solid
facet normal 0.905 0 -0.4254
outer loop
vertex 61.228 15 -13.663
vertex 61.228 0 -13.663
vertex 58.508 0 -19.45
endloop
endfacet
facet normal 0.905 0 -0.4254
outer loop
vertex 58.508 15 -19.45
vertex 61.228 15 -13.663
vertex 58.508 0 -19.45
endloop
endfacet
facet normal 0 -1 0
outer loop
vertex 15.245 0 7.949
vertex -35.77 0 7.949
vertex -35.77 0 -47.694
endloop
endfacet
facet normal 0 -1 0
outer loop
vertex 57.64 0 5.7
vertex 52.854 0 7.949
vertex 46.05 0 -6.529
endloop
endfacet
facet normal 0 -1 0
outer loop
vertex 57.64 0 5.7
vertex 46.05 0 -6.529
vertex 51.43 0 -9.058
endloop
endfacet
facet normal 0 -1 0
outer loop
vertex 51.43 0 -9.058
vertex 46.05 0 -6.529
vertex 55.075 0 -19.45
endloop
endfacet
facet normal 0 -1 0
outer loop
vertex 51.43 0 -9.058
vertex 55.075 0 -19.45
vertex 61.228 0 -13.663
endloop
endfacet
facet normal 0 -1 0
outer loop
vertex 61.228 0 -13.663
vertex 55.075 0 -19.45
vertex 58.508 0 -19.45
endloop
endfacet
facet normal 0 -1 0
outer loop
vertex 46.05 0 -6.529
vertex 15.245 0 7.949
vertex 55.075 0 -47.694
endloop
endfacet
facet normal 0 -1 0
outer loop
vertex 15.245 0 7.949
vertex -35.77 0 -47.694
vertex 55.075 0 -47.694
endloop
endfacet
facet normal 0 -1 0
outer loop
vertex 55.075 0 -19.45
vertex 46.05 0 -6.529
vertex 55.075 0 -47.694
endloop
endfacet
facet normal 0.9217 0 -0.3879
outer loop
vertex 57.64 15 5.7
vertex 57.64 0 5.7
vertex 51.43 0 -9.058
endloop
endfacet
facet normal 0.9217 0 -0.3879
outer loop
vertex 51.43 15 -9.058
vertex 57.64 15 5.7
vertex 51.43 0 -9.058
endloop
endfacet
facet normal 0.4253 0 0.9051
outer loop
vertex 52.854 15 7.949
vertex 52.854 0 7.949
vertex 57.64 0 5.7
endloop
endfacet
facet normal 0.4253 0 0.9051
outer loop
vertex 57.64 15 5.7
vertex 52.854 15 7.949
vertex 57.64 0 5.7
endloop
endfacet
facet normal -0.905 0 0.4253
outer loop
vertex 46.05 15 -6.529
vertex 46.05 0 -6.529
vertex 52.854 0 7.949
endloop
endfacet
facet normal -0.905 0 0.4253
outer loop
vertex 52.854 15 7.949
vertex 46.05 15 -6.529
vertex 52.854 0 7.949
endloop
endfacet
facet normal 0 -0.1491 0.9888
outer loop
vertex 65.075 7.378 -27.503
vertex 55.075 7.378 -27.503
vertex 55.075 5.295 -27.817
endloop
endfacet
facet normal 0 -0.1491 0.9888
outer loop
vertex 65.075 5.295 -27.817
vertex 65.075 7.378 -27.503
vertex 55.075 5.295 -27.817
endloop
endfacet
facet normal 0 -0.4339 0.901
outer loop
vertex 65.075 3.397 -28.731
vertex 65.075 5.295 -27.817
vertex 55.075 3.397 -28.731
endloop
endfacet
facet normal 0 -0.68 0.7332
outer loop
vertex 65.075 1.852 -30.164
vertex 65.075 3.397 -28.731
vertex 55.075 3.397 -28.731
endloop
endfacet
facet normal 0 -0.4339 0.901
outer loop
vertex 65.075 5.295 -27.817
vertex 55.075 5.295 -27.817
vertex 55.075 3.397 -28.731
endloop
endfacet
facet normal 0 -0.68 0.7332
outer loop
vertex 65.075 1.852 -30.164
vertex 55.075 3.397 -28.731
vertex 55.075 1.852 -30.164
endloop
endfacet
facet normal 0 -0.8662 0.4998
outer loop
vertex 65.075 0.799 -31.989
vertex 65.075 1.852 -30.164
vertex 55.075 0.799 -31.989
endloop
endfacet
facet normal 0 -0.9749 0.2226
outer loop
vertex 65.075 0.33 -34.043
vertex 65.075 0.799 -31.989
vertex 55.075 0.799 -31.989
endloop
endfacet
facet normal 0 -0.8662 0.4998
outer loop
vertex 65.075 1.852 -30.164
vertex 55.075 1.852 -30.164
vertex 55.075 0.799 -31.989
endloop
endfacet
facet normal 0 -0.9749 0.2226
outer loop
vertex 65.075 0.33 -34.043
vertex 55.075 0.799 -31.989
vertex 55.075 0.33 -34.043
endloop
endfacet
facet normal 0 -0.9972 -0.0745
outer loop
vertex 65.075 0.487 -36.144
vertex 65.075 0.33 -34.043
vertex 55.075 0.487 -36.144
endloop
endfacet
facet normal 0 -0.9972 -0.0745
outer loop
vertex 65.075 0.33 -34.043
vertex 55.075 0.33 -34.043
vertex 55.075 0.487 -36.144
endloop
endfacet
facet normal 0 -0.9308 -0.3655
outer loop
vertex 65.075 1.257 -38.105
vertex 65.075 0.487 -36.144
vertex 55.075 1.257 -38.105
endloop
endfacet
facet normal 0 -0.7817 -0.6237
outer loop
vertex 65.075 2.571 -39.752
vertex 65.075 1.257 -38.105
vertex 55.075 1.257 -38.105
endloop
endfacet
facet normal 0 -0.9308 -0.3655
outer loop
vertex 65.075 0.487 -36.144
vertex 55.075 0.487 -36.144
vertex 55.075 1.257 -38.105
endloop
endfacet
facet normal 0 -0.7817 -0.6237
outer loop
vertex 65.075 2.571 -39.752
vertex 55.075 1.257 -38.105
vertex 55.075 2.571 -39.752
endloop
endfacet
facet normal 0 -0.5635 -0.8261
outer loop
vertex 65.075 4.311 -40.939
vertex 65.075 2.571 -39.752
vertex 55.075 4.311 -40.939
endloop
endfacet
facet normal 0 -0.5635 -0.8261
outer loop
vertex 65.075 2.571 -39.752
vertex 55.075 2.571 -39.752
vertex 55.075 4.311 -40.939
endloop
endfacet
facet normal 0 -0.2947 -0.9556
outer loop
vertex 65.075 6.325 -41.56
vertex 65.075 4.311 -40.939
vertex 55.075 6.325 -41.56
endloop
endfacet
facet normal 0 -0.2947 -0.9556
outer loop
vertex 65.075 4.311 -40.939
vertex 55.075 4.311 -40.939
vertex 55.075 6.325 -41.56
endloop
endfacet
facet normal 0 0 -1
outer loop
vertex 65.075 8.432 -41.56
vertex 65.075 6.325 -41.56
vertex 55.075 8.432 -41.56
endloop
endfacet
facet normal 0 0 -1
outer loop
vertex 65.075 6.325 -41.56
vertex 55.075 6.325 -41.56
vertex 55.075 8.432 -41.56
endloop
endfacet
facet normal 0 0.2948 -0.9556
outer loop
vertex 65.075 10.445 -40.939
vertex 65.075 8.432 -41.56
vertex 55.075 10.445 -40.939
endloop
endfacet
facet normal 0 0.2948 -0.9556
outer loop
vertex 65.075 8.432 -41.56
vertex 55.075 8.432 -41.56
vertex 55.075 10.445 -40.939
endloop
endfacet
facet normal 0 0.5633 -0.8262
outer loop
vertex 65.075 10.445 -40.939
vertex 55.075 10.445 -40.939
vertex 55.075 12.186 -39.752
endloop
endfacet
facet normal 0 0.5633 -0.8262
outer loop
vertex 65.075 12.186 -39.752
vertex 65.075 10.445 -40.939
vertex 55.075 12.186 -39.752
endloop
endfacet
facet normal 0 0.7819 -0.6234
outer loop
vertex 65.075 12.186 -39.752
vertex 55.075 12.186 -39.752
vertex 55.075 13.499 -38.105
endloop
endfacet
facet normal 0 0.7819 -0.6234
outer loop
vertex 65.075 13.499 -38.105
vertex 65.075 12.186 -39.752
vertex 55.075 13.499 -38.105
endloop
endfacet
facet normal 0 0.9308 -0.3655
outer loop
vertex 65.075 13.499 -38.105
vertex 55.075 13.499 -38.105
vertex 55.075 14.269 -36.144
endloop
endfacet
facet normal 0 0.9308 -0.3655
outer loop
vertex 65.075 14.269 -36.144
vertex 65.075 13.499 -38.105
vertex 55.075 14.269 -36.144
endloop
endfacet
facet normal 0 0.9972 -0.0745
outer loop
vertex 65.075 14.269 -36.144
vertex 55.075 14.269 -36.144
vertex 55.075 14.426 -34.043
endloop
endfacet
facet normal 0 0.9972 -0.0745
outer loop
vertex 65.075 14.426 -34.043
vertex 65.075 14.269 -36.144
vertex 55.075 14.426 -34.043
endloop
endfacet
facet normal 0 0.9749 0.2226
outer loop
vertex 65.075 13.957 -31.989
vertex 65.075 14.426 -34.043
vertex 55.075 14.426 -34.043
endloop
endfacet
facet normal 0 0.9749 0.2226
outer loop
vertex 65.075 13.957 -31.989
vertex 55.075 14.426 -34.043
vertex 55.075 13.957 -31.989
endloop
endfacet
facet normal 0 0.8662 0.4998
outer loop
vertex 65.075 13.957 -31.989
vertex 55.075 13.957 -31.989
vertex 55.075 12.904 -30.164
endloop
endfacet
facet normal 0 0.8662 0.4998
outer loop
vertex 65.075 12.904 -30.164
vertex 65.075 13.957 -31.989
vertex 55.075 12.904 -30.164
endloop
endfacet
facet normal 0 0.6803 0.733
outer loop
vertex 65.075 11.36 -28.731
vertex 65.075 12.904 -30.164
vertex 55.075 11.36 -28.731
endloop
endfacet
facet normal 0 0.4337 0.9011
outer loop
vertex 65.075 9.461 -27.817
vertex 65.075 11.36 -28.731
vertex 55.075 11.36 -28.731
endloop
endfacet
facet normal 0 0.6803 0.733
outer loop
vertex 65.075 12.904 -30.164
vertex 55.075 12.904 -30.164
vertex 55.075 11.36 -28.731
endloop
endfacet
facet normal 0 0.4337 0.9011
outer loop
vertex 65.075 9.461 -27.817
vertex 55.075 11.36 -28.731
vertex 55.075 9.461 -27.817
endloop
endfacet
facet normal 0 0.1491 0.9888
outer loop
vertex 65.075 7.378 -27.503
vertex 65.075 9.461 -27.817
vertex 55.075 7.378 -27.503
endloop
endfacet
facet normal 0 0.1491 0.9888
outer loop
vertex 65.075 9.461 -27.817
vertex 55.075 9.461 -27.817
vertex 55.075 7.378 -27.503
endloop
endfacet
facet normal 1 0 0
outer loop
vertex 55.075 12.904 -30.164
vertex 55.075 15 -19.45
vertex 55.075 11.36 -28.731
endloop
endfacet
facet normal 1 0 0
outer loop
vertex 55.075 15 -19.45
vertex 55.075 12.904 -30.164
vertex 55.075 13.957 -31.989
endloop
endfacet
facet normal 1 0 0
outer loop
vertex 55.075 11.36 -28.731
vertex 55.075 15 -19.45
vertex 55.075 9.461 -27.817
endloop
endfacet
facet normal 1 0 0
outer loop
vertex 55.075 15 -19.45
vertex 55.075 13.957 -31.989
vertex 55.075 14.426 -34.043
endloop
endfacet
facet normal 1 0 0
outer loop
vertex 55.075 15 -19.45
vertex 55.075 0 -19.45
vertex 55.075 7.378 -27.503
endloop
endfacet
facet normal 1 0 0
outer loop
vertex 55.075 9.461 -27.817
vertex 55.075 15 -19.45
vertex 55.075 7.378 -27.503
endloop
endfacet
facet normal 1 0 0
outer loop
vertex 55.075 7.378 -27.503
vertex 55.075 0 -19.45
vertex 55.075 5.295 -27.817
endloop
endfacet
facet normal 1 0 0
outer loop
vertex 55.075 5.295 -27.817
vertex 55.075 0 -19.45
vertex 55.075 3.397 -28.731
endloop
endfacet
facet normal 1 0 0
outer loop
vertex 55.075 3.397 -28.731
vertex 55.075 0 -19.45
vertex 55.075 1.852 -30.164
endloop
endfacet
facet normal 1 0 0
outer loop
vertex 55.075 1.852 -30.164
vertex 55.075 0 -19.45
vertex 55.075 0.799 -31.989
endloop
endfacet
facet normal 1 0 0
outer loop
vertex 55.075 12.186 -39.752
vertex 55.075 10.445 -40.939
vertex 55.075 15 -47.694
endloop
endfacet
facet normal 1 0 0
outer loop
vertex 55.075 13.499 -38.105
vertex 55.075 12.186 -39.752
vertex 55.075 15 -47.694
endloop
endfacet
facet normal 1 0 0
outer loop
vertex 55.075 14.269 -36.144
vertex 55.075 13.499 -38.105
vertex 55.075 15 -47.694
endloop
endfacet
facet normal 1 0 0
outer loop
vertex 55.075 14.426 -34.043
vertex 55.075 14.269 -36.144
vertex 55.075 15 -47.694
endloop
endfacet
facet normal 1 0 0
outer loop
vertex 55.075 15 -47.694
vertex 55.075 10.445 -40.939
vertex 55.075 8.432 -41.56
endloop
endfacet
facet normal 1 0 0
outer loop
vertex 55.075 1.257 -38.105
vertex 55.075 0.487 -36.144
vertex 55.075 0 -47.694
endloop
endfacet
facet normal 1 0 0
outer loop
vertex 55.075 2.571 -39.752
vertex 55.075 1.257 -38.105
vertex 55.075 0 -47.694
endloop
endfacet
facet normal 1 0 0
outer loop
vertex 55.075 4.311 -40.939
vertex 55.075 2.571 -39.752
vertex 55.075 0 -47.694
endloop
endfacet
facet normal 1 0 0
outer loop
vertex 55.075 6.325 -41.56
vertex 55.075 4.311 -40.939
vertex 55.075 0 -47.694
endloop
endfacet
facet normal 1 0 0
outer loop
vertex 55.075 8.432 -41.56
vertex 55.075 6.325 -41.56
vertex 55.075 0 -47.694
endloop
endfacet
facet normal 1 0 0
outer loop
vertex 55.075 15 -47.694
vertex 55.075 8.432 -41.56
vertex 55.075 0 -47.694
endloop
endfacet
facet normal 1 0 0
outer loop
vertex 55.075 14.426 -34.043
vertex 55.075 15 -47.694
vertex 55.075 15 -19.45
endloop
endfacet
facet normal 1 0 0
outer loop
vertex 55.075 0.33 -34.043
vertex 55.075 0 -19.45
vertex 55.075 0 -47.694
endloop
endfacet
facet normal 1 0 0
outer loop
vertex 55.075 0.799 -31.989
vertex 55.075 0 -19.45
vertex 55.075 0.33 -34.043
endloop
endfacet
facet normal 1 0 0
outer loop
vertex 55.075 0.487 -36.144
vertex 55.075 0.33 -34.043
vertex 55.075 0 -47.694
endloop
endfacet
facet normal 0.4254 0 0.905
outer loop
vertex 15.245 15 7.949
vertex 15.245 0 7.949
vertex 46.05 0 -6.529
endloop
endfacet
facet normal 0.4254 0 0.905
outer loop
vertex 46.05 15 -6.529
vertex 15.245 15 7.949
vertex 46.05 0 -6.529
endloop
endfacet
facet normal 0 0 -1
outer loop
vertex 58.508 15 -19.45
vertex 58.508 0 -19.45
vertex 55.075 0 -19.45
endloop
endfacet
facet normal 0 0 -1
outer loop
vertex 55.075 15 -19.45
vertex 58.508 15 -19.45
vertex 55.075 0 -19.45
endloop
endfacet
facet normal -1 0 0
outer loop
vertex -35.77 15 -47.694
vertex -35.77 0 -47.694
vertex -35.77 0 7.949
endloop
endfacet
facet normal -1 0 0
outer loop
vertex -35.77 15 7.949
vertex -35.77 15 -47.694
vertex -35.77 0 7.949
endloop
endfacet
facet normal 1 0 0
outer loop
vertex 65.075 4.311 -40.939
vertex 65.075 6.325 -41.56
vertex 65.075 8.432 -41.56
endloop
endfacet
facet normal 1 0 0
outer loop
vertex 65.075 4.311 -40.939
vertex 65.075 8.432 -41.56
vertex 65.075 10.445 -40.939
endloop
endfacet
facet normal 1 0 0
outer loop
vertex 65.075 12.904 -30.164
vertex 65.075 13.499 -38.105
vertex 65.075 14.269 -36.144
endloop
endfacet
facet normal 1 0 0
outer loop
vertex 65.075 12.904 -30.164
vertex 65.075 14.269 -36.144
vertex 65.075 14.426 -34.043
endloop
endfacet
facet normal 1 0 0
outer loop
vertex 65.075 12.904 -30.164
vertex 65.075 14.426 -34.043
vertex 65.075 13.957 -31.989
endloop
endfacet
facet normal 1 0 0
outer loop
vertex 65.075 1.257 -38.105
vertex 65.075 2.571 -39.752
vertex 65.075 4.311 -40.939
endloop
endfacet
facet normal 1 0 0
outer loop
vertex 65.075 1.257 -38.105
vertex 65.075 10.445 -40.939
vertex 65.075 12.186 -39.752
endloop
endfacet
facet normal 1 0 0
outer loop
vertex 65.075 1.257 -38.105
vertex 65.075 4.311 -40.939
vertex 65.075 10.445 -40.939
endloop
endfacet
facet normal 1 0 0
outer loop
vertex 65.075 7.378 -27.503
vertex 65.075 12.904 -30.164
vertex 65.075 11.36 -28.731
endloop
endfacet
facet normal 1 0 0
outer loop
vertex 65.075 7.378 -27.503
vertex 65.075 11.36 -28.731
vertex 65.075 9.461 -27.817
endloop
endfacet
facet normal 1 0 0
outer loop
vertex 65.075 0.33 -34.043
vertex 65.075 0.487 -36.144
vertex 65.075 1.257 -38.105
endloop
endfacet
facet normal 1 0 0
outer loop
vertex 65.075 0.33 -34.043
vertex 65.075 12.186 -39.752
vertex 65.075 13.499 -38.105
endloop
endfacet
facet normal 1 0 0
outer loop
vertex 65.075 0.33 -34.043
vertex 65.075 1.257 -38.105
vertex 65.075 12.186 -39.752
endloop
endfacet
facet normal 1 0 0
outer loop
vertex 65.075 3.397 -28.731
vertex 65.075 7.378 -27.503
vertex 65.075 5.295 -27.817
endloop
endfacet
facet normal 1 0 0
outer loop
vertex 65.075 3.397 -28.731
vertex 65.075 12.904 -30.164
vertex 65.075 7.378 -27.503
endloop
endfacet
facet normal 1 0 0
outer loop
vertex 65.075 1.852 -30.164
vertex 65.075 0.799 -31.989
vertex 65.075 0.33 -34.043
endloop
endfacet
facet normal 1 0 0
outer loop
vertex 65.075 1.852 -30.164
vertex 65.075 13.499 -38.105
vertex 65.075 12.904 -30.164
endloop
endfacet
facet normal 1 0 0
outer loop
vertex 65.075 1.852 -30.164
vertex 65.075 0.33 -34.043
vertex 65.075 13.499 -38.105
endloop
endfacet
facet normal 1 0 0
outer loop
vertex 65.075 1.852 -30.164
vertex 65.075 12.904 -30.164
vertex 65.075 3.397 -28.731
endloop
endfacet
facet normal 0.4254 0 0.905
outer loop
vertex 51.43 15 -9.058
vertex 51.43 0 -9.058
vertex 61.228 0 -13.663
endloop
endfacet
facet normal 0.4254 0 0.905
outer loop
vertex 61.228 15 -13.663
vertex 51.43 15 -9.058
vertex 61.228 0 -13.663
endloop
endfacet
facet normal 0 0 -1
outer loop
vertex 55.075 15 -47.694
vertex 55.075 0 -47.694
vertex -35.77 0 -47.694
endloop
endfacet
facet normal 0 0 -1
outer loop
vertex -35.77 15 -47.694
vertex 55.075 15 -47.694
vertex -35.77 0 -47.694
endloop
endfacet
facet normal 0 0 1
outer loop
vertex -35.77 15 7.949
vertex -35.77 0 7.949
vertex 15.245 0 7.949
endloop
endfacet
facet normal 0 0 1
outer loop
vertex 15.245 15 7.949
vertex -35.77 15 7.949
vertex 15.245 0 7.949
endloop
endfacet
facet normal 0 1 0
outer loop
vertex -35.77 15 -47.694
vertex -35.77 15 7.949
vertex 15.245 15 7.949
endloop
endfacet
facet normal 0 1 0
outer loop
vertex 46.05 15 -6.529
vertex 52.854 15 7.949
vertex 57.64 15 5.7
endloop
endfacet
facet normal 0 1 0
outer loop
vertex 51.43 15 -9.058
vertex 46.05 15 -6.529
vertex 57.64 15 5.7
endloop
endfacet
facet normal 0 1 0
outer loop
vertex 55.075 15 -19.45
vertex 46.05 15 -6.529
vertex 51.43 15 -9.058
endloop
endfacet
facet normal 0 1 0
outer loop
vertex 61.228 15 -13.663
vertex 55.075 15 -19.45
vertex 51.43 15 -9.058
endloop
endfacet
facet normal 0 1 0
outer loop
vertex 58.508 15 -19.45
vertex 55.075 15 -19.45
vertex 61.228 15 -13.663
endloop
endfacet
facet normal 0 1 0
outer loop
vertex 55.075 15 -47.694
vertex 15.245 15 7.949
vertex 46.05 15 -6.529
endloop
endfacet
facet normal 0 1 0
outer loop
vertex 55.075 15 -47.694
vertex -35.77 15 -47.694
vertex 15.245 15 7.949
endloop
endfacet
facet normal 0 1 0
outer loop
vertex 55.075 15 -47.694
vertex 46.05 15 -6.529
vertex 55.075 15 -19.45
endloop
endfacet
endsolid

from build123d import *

# Parameters (mm, degrees)
BOSS_EXTRUDE1_DEPTH = 15
SKETCH2_R           = 7.067911596
BOSS_EXTRUDE2_DEPTH = 10


with BuildPart() as part:
    # Sketch1 → Boss-Extrude1 (new body)
    with BuildSketch(Plane(origin=(0, 0, 0), x_dir=(1, 0, 0), z_dir=(0, 1, 0))):
        Polygon((15.245454551, -7.948947663), (46.04976055, 6.529076156), (52.854431745, -7.948947663), (57.639851776, -5.699800249), (51.429912058, 9.057747365), (61.227828764, 13.662768217), (58.508060239, 19.44950976), (55.074851666, 19.44950976), (55.074851666, 47.693685978), (-35.770264484, 47.693685978), (-35.770264484, -7.948947663), align=None)
    extrude(amount=BOSS_EXTRUDE1_DEPTH)

    # Sketch2 → Boss-Extrude2 (add)
    with BuildSketch(Plane(origin=(55.074851666, 0, 0), x_dir=(0, 0, -1), z_dir=(1, 0, 0))):
        with Locations(Location((34.570742976, 7.378151278, 0), (0, 0, 180))):  # turned: the seam where the file's is
            Circle(SKETCH2_R)
    extrude(amount=BOSS_EXTRUDE2_DEPTH)


solid = part.part
